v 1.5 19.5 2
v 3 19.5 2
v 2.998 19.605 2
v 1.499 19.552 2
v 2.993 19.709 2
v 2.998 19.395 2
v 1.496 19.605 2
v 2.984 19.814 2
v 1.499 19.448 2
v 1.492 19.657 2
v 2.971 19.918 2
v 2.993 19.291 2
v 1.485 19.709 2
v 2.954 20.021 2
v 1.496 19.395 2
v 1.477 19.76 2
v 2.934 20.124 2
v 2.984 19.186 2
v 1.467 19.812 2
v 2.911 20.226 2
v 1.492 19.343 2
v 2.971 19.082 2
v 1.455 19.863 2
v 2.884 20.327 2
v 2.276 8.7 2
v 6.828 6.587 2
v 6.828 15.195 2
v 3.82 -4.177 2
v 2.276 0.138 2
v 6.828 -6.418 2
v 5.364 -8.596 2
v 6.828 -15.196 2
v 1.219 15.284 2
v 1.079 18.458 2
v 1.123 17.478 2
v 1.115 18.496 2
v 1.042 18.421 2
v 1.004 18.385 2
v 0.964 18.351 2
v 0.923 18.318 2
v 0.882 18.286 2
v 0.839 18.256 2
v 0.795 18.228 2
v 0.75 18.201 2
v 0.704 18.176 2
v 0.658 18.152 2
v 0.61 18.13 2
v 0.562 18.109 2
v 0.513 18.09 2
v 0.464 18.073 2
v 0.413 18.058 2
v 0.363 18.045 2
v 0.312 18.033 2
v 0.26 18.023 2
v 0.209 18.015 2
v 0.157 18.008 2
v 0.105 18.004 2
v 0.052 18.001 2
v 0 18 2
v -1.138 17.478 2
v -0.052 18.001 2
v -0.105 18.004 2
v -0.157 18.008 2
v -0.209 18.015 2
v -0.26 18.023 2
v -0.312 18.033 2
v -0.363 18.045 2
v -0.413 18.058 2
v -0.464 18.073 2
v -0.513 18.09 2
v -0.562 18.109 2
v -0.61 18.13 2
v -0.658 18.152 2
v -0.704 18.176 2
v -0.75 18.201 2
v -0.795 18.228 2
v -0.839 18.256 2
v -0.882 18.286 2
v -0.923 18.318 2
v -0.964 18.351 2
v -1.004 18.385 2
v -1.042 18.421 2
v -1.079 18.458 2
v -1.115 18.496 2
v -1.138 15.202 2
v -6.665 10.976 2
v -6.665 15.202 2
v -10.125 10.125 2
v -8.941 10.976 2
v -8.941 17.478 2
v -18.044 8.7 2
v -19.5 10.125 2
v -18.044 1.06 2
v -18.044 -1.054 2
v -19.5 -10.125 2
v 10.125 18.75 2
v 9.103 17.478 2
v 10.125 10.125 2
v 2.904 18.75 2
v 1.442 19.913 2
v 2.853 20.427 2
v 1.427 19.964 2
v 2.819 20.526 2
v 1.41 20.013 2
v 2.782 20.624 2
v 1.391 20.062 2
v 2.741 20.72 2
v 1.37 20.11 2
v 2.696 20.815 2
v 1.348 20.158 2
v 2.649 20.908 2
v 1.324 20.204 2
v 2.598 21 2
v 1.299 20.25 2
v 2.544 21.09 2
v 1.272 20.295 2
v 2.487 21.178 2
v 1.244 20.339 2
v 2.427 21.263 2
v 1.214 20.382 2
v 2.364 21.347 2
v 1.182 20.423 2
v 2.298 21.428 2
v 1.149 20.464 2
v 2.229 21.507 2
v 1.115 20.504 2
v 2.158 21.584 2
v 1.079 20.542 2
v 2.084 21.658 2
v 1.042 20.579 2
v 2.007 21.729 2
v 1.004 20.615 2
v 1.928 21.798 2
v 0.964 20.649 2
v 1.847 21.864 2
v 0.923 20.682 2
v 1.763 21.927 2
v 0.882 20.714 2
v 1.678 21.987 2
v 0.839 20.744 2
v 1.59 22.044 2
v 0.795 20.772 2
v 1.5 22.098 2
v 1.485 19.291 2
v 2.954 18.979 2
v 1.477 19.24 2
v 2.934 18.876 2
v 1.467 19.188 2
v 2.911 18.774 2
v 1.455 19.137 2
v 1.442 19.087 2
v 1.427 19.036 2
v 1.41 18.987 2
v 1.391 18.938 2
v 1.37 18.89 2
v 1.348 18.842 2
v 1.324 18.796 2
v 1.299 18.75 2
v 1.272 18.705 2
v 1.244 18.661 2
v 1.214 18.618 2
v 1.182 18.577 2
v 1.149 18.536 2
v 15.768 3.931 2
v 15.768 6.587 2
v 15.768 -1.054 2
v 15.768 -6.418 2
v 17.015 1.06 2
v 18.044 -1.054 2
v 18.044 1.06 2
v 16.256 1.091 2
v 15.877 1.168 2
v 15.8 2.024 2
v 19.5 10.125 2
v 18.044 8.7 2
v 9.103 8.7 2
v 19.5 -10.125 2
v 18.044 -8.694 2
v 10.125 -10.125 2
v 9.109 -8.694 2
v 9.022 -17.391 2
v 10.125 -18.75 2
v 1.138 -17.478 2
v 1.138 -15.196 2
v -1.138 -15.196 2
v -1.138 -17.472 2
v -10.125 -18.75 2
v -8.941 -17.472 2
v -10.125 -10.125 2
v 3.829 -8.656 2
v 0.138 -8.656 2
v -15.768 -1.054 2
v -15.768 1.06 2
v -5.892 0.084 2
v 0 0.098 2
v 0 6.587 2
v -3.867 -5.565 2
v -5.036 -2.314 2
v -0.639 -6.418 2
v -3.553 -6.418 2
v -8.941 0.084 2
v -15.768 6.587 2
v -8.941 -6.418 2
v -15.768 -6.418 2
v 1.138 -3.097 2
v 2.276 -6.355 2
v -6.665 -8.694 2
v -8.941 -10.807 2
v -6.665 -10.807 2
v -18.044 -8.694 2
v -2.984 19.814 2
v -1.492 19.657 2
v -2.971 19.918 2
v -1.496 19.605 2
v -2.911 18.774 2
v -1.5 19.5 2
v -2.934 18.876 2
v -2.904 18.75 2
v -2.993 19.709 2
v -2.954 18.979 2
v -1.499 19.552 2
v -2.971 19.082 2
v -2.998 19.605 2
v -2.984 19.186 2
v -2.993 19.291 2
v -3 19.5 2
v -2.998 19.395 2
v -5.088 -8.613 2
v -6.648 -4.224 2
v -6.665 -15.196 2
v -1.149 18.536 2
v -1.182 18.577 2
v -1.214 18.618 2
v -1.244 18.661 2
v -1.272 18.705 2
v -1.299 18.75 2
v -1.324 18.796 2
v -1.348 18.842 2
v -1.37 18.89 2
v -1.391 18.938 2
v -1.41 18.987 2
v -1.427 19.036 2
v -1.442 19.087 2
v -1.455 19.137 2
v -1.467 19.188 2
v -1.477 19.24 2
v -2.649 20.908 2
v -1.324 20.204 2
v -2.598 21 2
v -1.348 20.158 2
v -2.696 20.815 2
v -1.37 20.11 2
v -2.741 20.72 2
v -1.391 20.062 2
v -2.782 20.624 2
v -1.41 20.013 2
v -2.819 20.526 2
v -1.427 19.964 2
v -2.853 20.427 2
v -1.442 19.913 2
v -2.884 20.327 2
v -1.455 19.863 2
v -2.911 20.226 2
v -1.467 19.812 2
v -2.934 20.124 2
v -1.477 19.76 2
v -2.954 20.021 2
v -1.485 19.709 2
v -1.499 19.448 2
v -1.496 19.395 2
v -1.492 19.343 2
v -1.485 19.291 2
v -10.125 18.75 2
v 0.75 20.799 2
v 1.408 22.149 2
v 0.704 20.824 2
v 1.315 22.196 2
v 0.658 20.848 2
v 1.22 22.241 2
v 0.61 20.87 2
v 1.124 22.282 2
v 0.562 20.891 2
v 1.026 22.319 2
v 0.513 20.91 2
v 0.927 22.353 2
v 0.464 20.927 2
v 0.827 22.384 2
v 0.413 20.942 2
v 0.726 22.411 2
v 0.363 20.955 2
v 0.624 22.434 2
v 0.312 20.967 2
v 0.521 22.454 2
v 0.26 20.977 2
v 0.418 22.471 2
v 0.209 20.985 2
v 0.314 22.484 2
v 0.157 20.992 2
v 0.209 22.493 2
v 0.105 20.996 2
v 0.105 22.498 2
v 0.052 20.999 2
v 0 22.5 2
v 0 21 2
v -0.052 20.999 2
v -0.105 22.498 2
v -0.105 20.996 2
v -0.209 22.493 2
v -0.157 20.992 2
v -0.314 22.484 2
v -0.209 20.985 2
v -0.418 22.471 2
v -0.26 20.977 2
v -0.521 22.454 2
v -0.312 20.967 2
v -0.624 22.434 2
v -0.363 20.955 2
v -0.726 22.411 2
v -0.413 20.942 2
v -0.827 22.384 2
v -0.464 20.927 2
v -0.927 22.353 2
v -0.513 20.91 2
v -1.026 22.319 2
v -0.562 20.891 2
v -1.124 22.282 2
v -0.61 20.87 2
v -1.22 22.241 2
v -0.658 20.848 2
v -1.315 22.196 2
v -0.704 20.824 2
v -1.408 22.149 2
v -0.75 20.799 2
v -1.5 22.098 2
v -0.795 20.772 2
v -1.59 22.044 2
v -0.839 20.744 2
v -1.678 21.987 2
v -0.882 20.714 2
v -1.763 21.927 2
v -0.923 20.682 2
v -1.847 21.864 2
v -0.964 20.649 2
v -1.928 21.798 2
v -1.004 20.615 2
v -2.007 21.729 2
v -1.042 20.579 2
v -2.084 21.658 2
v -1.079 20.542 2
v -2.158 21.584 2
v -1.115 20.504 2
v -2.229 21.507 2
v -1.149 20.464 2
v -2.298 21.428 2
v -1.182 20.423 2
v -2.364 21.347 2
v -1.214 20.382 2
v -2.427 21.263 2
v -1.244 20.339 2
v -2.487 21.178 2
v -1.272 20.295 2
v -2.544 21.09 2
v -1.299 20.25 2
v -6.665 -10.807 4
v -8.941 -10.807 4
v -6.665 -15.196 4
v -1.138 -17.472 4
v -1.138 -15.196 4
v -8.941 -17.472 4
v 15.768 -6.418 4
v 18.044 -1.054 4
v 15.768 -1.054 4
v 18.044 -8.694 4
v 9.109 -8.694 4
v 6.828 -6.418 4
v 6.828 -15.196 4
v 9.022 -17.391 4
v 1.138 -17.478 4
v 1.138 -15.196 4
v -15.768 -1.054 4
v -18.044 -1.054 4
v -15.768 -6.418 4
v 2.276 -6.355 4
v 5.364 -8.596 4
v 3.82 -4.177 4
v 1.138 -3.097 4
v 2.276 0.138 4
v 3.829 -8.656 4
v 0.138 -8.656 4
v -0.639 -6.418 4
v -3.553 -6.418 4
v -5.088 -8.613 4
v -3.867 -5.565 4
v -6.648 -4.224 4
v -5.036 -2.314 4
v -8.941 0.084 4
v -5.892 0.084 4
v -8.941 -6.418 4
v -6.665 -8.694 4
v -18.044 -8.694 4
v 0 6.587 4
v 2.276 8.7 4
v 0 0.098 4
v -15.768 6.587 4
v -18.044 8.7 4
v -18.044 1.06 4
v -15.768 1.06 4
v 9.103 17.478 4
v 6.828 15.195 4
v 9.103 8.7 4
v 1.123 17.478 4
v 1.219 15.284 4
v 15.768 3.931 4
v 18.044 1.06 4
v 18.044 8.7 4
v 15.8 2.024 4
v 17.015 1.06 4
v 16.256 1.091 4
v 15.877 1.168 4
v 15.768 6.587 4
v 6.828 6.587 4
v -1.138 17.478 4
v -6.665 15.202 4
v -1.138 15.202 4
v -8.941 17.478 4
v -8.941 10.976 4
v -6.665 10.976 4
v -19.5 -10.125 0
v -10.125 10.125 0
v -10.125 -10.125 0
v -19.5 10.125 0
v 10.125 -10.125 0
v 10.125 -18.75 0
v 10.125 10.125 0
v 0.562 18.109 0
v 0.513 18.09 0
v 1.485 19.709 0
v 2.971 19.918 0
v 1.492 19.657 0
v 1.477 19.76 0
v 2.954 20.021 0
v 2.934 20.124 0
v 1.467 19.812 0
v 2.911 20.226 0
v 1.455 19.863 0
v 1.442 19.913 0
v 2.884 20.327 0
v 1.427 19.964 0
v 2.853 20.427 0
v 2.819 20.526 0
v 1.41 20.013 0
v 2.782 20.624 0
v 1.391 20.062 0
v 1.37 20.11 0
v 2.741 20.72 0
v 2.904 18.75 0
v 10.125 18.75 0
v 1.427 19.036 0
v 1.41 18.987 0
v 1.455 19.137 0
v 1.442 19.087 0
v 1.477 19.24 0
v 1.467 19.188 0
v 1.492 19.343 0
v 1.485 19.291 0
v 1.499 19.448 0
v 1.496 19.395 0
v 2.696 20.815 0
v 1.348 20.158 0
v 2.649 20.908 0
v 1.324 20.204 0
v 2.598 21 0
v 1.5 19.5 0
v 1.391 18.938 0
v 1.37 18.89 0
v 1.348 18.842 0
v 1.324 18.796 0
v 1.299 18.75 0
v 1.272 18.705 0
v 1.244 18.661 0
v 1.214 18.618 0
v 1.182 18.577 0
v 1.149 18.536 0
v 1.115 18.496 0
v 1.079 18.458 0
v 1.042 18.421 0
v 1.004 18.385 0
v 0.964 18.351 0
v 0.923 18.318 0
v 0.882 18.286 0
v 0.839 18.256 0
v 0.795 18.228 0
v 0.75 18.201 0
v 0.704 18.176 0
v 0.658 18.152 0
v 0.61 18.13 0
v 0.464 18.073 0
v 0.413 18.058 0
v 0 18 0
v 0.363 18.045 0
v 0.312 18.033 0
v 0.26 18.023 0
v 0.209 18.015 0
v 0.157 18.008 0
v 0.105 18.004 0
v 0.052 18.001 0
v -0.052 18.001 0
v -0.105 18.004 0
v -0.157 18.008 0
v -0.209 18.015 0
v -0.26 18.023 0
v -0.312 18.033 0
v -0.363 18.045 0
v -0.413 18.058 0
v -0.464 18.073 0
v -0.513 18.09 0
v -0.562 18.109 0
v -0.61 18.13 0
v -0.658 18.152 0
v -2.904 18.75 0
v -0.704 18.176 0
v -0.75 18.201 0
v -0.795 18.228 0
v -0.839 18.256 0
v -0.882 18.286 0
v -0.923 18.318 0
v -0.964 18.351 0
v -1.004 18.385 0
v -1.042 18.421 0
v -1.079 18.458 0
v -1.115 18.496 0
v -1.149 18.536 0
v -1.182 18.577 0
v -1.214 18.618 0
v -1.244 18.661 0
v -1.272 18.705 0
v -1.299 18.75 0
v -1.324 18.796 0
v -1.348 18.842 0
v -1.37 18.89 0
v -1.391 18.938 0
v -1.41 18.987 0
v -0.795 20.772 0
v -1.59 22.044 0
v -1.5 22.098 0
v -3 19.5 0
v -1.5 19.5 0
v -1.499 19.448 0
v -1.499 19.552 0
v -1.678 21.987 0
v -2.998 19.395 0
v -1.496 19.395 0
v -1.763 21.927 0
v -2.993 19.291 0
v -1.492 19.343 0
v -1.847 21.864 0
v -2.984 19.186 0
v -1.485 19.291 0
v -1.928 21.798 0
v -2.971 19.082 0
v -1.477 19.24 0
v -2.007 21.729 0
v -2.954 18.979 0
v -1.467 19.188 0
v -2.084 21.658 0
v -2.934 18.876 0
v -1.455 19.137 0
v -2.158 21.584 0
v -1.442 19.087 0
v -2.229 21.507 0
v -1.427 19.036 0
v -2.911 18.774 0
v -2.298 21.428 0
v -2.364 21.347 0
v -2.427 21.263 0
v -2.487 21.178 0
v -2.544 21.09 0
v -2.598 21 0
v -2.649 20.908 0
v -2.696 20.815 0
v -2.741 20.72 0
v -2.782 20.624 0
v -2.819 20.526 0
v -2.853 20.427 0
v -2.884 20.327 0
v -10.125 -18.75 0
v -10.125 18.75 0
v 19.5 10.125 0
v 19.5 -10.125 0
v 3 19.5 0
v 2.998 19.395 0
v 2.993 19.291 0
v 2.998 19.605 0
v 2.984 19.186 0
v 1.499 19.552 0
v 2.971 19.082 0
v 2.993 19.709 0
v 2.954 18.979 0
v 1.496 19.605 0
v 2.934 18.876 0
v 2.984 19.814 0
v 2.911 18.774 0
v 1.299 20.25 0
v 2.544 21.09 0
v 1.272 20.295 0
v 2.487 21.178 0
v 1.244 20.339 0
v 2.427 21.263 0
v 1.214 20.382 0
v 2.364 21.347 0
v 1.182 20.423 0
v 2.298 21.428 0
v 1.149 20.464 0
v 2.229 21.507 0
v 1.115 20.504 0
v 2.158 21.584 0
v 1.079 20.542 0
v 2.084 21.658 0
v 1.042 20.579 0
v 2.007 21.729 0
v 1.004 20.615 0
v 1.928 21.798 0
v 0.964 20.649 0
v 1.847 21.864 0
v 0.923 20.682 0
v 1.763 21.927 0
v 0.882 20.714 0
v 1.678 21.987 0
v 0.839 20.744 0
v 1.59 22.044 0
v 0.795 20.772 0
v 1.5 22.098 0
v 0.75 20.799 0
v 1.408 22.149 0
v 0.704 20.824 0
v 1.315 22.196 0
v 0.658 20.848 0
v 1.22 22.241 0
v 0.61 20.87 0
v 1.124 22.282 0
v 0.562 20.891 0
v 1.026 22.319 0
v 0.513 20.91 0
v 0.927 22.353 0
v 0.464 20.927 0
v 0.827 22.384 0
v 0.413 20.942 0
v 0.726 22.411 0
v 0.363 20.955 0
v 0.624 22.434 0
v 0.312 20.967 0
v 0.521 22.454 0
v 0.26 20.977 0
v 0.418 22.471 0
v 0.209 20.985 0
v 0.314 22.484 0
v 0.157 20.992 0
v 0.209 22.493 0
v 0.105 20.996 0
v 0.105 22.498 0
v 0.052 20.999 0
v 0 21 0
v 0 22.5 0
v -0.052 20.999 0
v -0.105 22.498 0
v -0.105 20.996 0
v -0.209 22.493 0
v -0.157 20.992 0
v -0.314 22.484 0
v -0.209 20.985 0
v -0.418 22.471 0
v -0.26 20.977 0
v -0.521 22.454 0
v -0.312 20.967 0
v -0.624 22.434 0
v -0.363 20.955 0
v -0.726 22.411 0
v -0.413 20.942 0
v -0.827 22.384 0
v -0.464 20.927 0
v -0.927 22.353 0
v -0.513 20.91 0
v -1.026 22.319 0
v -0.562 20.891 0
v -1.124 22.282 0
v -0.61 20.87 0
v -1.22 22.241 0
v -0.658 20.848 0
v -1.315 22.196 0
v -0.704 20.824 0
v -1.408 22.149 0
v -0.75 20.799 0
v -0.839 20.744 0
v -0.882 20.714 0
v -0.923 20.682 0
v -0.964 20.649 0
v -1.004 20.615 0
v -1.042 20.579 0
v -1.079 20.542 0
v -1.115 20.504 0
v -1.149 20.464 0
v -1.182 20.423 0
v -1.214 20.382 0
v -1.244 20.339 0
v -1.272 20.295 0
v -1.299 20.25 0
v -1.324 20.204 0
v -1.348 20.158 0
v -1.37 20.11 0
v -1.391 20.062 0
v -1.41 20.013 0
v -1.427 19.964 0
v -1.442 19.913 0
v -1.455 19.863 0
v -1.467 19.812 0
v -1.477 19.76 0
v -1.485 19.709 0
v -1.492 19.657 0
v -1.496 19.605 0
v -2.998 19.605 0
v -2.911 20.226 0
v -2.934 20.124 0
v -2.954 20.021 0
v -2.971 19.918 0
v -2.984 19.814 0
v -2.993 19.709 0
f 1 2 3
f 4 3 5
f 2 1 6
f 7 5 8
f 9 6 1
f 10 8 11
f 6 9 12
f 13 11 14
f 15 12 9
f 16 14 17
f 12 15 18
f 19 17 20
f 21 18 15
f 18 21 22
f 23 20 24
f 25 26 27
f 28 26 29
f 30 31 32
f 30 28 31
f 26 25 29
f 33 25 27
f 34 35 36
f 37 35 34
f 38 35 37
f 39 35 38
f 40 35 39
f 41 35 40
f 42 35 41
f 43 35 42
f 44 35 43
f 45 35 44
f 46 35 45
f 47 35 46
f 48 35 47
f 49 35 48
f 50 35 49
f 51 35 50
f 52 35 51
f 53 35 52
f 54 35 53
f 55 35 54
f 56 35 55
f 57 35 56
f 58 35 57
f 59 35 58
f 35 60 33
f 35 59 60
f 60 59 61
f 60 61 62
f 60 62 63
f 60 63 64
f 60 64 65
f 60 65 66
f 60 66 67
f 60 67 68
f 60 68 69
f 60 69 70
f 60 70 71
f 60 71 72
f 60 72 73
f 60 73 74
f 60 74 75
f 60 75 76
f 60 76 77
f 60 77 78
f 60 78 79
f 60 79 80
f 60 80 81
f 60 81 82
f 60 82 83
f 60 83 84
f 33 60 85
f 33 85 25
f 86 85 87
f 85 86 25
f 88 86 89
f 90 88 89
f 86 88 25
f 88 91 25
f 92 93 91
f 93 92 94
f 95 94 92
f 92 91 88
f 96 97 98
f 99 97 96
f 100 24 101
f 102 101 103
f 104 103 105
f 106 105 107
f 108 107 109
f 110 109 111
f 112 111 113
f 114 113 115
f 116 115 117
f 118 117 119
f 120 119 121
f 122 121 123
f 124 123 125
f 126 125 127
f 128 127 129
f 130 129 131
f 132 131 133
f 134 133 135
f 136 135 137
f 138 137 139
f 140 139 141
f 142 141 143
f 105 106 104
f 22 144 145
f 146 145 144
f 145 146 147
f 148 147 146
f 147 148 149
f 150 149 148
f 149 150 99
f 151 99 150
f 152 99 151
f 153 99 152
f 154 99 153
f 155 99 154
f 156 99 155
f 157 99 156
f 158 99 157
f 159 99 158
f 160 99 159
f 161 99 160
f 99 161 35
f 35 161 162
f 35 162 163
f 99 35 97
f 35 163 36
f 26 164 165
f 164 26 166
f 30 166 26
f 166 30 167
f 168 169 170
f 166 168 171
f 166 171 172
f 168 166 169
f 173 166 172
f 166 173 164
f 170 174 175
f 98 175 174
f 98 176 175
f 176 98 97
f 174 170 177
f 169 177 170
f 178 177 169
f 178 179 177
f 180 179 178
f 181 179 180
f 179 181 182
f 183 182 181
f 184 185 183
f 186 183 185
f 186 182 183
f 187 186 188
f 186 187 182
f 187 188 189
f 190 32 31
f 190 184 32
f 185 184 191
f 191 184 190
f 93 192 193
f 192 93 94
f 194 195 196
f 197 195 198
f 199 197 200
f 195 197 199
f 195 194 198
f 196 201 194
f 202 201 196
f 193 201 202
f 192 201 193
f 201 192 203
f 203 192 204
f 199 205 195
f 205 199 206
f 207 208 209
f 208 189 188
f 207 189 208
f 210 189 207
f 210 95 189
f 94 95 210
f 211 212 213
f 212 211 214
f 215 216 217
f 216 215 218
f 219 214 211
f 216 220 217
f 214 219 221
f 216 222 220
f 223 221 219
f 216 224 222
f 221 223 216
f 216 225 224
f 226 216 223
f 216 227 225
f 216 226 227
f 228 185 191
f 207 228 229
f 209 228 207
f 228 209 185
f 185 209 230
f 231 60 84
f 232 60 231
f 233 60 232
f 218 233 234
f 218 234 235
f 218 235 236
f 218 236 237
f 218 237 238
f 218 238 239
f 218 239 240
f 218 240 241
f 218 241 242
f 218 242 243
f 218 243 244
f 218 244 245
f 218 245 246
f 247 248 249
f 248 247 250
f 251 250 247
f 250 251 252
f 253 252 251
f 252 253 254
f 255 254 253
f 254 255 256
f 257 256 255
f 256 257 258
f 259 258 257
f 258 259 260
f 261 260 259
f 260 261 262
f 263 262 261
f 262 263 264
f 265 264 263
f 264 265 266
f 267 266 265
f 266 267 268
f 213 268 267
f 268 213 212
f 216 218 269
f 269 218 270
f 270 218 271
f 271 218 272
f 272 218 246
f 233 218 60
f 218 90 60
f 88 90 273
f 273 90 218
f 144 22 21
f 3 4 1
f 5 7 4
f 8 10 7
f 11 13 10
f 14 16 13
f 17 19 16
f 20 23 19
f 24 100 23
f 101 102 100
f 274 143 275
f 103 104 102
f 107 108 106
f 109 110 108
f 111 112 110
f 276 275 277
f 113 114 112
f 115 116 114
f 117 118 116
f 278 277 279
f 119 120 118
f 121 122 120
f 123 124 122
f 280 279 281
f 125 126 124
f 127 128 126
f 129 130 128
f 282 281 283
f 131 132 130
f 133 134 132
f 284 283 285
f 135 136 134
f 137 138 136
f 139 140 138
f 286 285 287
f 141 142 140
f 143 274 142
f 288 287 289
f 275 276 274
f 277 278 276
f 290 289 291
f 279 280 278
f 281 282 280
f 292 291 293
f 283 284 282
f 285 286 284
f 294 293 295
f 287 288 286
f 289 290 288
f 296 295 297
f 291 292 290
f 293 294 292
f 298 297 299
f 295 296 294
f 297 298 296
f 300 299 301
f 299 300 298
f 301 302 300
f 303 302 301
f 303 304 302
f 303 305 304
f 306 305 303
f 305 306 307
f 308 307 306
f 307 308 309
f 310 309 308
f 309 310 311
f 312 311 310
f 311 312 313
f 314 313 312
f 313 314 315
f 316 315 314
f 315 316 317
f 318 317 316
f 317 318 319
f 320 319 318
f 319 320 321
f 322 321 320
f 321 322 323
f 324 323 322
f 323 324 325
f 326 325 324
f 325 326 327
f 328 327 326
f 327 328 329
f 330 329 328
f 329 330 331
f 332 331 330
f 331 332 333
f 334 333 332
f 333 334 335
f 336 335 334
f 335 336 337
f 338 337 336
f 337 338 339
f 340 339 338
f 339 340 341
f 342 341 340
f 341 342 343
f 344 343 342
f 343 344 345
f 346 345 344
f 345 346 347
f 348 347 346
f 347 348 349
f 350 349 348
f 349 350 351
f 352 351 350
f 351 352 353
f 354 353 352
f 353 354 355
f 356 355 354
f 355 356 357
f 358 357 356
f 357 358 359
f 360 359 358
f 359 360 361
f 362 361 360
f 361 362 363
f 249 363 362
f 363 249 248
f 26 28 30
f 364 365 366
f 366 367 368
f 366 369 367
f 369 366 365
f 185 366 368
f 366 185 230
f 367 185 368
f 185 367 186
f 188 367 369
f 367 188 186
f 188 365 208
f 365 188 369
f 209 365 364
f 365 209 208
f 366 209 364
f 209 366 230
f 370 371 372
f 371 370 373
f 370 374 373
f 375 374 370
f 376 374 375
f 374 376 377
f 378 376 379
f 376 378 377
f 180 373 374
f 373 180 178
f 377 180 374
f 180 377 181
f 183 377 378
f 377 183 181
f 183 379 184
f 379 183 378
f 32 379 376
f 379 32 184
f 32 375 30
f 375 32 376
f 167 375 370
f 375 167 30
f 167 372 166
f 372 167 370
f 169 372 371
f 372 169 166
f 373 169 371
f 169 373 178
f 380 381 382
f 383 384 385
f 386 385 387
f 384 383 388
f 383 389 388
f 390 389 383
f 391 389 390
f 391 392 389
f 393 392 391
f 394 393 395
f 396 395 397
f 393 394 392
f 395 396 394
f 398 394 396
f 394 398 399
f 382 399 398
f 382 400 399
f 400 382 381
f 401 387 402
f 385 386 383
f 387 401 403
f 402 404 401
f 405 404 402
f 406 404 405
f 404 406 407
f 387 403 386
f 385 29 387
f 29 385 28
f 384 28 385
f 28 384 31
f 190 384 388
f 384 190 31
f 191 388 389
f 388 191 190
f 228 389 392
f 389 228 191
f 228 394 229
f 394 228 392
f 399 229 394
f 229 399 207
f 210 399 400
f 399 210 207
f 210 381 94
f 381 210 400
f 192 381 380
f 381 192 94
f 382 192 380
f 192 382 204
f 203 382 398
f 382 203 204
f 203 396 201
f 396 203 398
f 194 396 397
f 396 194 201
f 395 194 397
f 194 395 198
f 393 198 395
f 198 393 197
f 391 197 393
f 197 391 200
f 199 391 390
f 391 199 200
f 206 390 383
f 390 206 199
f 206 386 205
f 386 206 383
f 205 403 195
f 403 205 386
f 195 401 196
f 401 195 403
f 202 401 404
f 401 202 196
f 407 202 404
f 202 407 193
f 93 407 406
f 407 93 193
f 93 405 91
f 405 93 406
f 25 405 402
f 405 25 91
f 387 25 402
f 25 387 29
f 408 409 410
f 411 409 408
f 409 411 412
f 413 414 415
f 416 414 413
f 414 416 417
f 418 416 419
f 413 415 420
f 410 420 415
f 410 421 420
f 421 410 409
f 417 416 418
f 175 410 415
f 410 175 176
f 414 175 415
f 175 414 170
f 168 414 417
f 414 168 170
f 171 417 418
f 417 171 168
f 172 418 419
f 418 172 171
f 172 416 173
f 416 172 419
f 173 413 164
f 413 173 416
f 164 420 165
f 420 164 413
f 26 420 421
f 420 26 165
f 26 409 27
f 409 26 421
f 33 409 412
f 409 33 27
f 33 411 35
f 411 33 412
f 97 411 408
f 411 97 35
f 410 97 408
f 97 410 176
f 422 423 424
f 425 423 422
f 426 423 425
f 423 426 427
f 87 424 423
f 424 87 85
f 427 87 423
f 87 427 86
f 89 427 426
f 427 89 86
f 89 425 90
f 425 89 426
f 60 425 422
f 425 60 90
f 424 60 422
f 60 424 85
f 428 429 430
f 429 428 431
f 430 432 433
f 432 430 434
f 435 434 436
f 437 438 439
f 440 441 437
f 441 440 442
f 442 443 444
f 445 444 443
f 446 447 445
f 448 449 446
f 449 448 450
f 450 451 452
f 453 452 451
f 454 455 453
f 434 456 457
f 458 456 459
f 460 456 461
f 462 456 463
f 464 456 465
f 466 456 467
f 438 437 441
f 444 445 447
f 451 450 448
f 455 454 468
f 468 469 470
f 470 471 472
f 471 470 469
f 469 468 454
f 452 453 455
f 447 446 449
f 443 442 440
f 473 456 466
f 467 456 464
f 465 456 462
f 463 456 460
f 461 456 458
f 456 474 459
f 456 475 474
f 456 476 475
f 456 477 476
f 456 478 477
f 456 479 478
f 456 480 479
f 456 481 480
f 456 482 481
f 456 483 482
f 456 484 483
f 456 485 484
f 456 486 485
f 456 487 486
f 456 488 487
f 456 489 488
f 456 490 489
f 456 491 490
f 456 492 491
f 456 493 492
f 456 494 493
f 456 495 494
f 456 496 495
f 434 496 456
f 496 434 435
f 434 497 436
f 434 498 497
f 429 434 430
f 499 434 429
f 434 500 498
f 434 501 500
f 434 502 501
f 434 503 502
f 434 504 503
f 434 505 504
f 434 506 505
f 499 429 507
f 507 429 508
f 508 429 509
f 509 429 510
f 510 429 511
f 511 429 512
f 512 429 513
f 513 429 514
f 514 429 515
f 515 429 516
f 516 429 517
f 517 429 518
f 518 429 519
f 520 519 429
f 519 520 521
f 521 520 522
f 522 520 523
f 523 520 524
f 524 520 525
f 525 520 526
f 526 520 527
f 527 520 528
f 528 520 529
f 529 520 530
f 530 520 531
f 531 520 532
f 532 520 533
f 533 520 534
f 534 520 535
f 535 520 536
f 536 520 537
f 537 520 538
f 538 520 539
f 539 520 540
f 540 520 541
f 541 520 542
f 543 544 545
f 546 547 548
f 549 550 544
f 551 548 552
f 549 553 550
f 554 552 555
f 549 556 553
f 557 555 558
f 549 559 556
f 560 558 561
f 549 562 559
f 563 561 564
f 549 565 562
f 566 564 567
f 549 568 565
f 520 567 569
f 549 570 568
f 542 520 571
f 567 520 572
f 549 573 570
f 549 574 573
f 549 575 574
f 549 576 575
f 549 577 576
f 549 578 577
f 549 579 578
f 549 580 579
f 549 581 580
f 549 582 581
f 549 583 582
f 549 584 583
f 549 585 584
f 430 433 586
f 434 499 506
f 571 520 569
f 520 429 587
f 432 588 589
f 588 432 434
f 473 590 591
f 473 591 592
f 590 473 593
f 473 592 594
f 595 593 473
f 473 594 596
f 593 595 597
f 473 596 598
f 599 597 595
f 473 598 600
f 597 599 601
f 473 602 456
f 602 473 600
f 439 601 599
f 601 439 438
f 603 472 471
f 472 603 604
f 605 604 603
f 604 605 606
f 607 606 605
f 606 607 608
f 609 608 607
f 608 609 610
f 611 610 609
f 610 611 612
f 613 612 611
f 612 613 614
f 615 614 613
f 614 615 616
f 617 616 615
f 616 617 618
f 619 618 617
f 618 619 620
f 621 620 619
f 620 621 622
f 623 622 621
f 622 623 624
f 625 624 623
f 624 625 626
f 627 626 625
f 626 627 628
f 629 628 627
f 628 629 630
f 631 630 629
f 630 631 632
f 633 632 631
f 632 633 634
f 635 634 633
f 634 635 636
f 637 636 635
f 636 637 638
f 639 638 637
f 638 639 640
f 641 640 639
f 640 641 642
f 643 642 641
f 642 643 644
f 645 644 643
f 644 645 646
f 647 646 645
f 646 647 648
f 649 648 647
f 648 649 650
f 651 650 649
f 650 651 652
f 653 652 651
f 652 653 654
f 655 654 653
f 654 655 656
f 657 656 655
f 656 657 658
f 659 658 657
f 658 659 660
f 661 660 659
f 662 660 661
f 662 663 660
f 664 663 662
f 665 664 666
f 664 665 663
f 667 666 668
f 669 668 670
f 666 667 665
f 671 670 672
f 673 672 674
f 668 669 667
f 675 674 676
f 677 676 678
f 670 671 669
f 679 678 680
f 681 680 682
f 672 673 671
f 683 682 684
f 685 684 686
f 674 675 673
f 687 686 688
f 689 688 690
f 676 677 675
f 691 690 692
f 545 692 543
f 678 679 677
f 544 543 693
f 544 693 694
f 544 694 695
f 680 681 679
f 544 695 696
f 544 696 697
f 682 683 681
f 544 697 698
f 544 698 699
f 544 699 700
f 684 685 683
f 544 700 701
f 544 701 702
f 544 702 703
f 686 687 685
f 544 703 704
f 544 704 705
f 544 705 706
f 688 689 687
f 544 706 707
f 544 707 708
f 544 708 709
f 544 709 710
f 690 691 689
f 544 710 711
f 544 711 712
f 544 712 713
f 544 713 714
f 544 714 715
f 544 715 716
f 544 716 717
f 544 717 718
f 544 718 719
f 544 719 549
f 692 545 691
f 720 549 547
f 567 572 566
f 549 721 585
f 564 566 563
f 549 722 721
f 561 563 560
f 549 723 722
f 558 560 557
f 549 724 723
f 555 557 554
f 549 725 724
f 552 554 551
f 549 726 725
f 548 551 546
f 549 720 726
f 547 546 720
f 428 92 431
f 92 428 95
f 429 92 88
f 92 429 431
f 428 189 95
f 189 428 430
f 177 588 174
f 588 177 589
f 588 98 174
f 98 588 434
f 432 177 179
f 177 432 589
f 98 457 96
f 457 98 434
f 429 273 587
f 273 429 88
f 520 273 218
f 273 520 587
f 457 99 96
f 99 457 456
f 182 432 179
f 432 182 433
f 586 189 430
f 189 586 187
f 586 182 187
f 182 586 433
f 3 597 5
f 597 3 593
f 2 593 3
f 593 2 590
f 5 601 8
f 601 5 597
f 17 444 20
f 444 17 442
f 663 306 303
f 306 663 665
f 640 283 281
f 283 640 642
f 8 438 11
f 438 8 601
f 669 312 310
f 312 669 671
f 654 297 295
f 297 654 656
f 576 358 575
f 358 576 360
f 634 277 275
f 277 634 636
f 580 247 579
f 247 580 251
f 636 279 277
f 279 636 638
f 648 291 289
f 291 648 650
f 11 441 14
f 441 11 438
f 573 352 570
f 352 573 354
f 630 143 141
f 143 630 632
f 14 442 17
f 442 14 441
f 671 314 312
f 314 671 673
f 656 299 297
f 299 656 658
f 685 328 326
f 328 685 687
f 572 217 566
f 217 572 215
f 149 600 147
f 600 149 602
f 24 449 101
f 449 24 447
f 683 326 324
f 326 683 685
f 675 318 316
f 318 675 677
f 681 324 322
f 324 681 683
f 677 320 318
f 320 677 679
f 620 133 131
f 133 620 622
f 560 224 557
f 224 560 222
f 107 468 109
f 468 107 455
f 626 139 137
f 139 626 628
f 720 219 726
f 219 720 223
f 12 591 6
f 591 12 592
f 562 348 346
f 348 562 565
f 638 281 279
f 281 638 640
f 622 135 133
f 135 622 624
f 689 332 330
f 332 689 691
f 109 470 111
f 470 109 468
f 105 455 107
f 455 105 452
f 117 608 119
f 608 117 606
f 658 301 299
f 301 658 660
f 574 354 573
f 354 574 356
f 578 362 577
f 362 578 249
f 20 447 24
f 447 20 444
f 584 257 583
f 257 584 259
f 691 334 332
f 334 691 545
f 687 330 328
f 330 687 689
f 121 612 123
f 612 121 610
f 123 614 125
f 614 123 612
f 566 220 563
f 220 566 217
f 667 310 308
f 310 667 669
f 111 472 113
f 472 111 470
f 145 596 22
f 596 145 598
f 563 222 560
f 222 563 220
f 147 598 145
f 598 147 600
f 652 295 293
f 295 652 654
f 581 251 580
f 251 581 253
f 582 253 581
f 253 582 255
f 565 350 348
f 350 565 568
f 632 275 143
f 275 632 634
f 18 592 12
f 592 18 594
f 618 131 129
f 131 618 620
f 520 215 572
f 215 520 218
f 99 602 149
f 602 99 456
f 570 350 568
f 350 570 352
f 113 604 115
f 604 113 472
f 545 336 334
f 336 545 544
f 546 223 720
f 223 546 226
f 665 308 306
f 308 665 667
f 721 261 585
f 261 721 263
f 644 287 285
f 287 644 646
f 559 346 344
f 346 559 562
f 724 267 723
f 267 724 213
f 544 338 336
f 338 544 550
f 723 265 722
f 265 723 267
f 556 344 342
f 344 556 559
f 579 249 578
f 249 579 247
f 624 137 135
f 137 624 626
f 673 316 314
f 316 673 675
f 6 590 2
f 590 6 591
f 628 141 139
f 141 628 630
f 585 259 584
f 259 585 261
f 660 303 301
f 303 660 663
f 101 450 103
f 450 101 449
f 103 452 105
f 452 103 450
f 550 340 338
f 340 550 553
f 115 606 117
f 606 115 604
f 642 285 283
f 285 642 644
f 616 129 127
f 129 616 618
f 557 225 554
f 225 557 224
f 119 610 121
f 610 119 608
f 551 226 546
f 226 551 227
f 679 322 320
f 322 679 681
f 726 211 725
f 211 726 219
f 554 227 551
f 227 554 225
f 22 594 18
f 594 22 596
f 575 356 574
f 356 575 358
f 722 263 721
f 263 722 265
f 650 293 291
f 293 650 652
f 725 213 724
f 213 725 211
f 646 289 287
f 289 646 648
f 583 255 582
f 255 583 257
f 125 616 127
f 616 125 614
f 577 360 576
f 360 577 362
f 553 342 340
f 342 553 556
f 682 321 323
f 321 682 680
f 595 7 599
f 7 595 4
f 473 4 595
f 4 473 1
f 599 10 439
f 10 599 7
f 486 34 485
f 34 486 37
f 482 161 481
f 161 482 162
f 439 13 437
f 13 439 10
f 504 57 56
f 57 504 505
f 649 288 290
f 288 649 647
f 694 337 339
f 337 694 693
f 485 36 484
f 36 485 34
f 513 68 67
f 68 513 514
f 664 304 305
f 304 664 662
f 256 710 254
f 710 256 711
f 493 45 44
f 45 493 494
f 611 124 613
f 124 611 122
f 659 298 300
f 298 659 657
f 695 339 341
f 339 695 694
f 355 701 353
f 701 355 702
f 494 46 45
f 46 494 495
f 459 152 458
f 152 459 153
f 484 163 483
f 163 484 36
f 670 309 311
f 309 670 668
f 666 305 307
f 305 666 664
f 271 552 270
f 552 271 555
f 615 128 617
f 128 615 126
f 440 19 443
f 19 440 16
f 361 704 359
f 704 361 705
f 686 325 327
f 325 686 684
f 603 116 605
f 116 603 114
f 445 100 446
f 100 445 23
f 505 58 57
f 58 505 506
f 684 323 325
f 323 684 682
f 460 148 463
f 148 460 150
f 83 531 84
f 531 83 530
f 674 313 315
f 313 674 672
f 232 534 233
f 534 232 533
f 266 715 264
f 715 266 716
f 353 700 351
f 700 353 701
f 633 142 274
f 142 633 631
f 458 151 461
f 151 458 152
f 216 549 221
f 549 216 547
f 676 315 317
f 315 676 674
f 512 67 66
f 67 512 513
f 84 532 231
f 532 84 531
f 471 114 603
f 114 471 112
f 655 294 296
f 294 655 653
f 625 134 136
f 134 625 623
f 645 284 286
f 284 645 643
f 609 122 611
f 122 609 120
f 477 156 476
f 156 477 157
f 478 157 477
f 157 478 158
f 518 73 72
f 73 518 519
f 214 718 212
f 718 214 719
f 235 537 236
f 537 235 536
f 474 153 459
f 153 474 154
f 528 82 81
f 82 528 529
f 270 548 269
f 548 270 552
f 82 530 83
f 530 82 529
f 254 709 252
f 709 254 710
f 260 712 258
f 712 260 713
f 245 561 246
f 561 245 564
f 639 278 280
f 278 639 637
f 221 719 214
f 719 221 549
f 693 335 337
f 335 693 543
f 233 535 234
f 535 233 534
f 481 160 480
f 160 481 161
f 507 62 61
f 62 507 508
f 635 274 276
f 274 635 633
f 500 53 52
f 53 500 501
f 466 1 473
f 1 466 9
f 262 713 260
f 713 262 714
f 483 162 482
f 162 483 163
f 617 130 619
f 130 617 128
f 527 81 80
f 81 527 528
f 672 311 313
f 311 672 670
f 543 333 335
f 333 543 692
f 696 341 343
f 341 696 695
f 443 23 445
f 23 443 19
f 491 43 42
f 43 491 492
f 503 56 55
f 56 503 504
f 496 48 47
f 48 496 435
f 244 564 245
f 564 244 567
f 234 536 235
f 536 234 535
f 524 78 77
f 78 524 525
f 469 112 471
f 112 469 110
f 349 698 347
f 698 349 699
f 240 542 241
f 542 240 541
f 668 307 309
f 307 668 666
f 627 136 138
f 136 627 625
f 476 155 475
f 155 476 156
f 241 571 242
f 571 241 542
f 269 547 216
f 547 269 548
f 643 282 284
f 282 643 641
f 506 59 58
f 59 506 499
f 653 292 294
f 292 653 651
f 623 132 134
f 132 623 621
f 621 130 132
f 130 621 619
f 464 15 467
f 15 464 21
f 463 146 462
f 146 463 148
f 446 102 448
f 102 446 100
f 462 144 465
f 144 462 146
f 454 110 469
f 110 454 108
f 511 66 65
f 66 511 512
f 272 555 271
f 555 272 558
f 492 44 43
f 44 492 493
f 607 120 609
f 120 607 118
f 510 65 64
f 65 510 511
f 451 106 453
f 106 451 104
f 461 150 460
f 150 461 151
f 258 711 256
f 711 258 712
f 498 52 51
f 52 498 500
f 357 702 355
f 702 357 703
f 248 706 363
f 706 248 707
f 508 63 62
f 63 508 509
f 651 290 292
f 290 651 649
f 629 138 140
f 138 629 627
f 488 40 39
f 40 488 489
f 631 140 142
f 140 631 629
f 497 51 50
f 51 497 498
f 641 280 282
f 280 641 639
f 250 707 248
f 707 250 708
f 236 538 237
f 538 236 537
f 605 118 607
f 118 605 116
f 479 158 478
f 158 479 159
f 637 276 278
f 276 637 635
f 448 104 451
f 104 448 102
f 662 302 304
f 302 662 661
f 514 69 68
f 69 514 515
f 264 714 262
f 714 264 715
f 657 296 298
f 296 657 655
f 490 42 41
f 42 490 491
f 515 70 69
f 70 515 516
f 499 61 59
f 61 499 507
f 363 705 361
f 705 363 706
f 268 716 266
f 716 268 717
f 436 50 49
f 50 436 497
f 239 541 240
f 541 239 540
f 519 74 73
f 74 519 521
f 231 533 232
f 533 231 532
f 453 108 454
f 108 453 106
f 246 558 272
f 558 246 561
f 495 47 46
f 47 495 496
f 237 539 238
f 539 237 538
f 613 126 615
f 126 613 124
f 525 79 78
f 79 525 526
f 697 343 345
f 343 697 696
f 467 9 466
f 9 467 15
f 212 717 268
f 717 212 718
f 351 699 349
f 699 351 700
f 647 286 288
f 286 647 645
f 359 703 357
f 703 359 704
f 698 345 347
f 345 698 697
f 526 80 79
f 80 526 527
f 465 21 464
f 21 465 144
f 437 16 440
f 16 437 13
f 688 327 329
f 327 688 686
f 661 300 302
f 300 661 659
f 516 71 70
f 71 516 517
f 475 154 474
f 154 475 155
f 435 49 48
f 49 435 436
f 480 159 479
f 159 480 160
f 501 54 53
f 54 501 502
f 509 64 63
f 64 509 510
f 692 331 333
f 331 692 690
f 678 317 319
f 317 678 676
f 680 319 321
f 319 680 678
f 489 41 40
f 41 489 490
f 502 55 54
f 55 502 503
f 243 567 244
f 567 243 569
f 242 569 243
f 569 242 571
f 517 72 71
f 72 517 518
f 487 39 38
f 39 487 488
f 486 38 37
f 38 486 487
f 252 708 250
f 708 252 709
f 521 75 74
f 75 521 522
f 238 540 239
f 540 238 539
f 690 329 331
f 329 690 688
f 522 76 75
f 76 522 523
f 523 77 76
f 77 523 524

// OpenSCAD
$fn = $preview ? 36 : 180;

module logo()
{
    
    // Module names are of the form poly_<inkscape-path-id>().
    // As a result you can associate a polygon in this OpenSCAD program with the
    //  corresponding SVG element in the Inkscape document by looking for 
    //  the XML element with the attribute id="inkscape-path-id".

    // Paths have their own variables so they can be imported and used 
    //  in polygon(points) structures in other programs.
    // The NN_points is the list of all polygon XY vertices. 
    // There may be an NN_paths variable as well. If it exists then it 
    //  defines the nested paths. Both must be used in the 
    //  polygon(points, paths) variant of the command.

    profile_scale = 25.4/90; //made in inkscape in mm

    // helper functions to determine the X,Y dimensions of the profiles
    function min_x(shape_points) = min([ for (x = shape_points) min(x[0])]);
    function max_x(shape_points) = max([ for (x = shape_points) max(x[0])]);
    function min_y(shape_points) = min([ for (x = shape_points) min(x[1])]);
    function max_y(shape_points) = max([ for (x = shape_points) max(x[1])]);

    height = 2;
    width = 1.0;


    path4537_0_points = [[-21.120000,33.401170],[-21.120000,25.529170],[-18.432000,25.529170],[-15.744000,25.529170],[-15.744000,30.713170],[-15.744000,35.897170],[-9.216000,35.897170],[-2.688000,35.897170],[-2.688000,38.585170],[-2.688000,41.273170],[-11.904000,41.273170],[-21.120000,41.273170],[-21.120000,33.401170]];
    path4537_1_points = [[2.688000,38.591998],[2.688000,35.897170],[9.408000,35.897170],[16.128000,35.897170],[16.128000,25.529170],[16.128000,15.161170],[26.688000,15.161170],[37.248000,15.161170],[37.248000,8.825170],[37.248000,2.489170],[39.936000,2.489170],[42.624000,2.489170],[42.624000,11.513170],[42.624000,20.537170],[32.070271,20.537170],[21.516545,20.537170],[21.414271,30.809170],[21.312000,41.081170],[12.000000,41.184000],[2.688000,41.286830],[2.688000,38.591998]];
    path4537_2_points = [[-42.624000,11.513170],[-42.624000,2.489170],[-39.936000,2.489170],[-37.248000,2.489170],[-37.248000,8.825170],[-37.248000,15.161170],[-29.184000,15.161170],[-21.120000,15.161170],[-21.120000,7.481170],[-21.120000,-0.198830],[-17.518994,-0.198830],[-13.917984,-0.198830],[-11.896055,5.465170],[-9.133471,13.145170],[-8.392819,15.161170],[-1.508410,15.161170],[5.376000,15.012105],[2.688000,7.316246],[0.000000,-0.230552],[0.000000,-7.894689],[0.000000,-15.558830],[-18.624000,-15.558830],[-37.248000,-15.558830],[-37.248000,-9.030830],[-37.248000,-2.502830],[-39.936000,-2.502830],[-42.624000,-2.502830],[-42.624000,-11.526830],[-42.624000,-20.550830],[-18.624000,-20.550830],[5.376000,-20.550830],[5.376000,-10.438463],[5.376000,-0.326095],[9.024000,9.867396],[12.672000,20.304347],[9.045447,20.446529],[0.326289,20.446488],[-12.019423,20.345170],[-13.861190,15.161170],[-15.702958,9.977170],[-15.723479,15.257170],[-15.744000,20.537170],[-29.184000,20.537170],[-42.624000,20.537170],[-42.624000,11.513170]];
    path4537_3_points = [[37.504000,-2.758831],[37.323200,-4.782029],[37.248000,-9.286831],[37.248000,-15.558830],[26.688000,-15.558830],[16.128000,-15.558830],[16.128000,-25.725762],[16.128000,-35.892694],[9.504000,-35.997762],[2.880000,-36.102830],[2.766455,-38.694830],[2.652910,-41.286830],[12.078455,-41.286830],[21.504000,-41.286830],[21.504000,-30.918830],[21.504000,-20.550830],[32.064000,-20.550830],[42.624000,-20.550830],[42.624000,-11.526830],[42.624000,-2.502830],[40.192000,-2.502830],[38.399200,-2.578030],[37.504000,-2.758831],[37.504000,-2.758831]];
    path4537_4_points = [[-21.120000,-33.606830],[-21.120000,-41.286830],[-11.904000,-41.286830],[-2.688000,-41.286830],[-2.688000,-38.598830],[-2.688000,-35.910830],[-9.216000,-35.910830],[-15.744000,-35.910830],[-15.744000,-30.918830],[-15.744000,-25.926830],[-18.432000,-25.926830],[-21.120000,-25.926830],[-21.120000,-33.606830]];

    module poly_path4537(h, w, res=4)  {
      scale([profile_scale, -profile_scale, 1])
      union()  {
        linear_extrude(height=h)
          polygon(path4537_0_points);
        linear_extrude(height=h)
          polygon(path4537_1_points);
        linear_extrude(height=h)
          polygon(path4537_2_points);
        linear_extrude(height=h)
          polygon(path4537_3_points);
        linear_extrude(height=h)
          polygon(path4537_4_points);
      }
    }

    // The shapes
    poly_path4537(height, width);

    
}


module base()
{
    a = 27;
    translate([-a+1,-a/2,0]) cube([a,a,2]);
    translate([-1,-a/2,0]) cube([a,a,2]);
    translate([-a/2,0-2,0]) cube([a,a,2]);
    translate([-a/2,-a+2,0]) cube([a,a,2]);
}

module key_ring()
{
    color("white") translate([0,0,2]) scale([2,2,1]) logo();
    
    A = 30;
    a = 26;
    color([0.2,0.2,0.2])
    {
        //translate([-A/2,-A/2,0]) cube([A,A,2]);
        difference()
        {
            union()
            {
                base();
                translate([0,a,0]) cylinder(d=8,h=2);
            }
            translate([0,a,-0.1]) cylinder(d=4,h=2.2);
        }
        
    }
}

scale([0.75,0.75,1])key_ring();
